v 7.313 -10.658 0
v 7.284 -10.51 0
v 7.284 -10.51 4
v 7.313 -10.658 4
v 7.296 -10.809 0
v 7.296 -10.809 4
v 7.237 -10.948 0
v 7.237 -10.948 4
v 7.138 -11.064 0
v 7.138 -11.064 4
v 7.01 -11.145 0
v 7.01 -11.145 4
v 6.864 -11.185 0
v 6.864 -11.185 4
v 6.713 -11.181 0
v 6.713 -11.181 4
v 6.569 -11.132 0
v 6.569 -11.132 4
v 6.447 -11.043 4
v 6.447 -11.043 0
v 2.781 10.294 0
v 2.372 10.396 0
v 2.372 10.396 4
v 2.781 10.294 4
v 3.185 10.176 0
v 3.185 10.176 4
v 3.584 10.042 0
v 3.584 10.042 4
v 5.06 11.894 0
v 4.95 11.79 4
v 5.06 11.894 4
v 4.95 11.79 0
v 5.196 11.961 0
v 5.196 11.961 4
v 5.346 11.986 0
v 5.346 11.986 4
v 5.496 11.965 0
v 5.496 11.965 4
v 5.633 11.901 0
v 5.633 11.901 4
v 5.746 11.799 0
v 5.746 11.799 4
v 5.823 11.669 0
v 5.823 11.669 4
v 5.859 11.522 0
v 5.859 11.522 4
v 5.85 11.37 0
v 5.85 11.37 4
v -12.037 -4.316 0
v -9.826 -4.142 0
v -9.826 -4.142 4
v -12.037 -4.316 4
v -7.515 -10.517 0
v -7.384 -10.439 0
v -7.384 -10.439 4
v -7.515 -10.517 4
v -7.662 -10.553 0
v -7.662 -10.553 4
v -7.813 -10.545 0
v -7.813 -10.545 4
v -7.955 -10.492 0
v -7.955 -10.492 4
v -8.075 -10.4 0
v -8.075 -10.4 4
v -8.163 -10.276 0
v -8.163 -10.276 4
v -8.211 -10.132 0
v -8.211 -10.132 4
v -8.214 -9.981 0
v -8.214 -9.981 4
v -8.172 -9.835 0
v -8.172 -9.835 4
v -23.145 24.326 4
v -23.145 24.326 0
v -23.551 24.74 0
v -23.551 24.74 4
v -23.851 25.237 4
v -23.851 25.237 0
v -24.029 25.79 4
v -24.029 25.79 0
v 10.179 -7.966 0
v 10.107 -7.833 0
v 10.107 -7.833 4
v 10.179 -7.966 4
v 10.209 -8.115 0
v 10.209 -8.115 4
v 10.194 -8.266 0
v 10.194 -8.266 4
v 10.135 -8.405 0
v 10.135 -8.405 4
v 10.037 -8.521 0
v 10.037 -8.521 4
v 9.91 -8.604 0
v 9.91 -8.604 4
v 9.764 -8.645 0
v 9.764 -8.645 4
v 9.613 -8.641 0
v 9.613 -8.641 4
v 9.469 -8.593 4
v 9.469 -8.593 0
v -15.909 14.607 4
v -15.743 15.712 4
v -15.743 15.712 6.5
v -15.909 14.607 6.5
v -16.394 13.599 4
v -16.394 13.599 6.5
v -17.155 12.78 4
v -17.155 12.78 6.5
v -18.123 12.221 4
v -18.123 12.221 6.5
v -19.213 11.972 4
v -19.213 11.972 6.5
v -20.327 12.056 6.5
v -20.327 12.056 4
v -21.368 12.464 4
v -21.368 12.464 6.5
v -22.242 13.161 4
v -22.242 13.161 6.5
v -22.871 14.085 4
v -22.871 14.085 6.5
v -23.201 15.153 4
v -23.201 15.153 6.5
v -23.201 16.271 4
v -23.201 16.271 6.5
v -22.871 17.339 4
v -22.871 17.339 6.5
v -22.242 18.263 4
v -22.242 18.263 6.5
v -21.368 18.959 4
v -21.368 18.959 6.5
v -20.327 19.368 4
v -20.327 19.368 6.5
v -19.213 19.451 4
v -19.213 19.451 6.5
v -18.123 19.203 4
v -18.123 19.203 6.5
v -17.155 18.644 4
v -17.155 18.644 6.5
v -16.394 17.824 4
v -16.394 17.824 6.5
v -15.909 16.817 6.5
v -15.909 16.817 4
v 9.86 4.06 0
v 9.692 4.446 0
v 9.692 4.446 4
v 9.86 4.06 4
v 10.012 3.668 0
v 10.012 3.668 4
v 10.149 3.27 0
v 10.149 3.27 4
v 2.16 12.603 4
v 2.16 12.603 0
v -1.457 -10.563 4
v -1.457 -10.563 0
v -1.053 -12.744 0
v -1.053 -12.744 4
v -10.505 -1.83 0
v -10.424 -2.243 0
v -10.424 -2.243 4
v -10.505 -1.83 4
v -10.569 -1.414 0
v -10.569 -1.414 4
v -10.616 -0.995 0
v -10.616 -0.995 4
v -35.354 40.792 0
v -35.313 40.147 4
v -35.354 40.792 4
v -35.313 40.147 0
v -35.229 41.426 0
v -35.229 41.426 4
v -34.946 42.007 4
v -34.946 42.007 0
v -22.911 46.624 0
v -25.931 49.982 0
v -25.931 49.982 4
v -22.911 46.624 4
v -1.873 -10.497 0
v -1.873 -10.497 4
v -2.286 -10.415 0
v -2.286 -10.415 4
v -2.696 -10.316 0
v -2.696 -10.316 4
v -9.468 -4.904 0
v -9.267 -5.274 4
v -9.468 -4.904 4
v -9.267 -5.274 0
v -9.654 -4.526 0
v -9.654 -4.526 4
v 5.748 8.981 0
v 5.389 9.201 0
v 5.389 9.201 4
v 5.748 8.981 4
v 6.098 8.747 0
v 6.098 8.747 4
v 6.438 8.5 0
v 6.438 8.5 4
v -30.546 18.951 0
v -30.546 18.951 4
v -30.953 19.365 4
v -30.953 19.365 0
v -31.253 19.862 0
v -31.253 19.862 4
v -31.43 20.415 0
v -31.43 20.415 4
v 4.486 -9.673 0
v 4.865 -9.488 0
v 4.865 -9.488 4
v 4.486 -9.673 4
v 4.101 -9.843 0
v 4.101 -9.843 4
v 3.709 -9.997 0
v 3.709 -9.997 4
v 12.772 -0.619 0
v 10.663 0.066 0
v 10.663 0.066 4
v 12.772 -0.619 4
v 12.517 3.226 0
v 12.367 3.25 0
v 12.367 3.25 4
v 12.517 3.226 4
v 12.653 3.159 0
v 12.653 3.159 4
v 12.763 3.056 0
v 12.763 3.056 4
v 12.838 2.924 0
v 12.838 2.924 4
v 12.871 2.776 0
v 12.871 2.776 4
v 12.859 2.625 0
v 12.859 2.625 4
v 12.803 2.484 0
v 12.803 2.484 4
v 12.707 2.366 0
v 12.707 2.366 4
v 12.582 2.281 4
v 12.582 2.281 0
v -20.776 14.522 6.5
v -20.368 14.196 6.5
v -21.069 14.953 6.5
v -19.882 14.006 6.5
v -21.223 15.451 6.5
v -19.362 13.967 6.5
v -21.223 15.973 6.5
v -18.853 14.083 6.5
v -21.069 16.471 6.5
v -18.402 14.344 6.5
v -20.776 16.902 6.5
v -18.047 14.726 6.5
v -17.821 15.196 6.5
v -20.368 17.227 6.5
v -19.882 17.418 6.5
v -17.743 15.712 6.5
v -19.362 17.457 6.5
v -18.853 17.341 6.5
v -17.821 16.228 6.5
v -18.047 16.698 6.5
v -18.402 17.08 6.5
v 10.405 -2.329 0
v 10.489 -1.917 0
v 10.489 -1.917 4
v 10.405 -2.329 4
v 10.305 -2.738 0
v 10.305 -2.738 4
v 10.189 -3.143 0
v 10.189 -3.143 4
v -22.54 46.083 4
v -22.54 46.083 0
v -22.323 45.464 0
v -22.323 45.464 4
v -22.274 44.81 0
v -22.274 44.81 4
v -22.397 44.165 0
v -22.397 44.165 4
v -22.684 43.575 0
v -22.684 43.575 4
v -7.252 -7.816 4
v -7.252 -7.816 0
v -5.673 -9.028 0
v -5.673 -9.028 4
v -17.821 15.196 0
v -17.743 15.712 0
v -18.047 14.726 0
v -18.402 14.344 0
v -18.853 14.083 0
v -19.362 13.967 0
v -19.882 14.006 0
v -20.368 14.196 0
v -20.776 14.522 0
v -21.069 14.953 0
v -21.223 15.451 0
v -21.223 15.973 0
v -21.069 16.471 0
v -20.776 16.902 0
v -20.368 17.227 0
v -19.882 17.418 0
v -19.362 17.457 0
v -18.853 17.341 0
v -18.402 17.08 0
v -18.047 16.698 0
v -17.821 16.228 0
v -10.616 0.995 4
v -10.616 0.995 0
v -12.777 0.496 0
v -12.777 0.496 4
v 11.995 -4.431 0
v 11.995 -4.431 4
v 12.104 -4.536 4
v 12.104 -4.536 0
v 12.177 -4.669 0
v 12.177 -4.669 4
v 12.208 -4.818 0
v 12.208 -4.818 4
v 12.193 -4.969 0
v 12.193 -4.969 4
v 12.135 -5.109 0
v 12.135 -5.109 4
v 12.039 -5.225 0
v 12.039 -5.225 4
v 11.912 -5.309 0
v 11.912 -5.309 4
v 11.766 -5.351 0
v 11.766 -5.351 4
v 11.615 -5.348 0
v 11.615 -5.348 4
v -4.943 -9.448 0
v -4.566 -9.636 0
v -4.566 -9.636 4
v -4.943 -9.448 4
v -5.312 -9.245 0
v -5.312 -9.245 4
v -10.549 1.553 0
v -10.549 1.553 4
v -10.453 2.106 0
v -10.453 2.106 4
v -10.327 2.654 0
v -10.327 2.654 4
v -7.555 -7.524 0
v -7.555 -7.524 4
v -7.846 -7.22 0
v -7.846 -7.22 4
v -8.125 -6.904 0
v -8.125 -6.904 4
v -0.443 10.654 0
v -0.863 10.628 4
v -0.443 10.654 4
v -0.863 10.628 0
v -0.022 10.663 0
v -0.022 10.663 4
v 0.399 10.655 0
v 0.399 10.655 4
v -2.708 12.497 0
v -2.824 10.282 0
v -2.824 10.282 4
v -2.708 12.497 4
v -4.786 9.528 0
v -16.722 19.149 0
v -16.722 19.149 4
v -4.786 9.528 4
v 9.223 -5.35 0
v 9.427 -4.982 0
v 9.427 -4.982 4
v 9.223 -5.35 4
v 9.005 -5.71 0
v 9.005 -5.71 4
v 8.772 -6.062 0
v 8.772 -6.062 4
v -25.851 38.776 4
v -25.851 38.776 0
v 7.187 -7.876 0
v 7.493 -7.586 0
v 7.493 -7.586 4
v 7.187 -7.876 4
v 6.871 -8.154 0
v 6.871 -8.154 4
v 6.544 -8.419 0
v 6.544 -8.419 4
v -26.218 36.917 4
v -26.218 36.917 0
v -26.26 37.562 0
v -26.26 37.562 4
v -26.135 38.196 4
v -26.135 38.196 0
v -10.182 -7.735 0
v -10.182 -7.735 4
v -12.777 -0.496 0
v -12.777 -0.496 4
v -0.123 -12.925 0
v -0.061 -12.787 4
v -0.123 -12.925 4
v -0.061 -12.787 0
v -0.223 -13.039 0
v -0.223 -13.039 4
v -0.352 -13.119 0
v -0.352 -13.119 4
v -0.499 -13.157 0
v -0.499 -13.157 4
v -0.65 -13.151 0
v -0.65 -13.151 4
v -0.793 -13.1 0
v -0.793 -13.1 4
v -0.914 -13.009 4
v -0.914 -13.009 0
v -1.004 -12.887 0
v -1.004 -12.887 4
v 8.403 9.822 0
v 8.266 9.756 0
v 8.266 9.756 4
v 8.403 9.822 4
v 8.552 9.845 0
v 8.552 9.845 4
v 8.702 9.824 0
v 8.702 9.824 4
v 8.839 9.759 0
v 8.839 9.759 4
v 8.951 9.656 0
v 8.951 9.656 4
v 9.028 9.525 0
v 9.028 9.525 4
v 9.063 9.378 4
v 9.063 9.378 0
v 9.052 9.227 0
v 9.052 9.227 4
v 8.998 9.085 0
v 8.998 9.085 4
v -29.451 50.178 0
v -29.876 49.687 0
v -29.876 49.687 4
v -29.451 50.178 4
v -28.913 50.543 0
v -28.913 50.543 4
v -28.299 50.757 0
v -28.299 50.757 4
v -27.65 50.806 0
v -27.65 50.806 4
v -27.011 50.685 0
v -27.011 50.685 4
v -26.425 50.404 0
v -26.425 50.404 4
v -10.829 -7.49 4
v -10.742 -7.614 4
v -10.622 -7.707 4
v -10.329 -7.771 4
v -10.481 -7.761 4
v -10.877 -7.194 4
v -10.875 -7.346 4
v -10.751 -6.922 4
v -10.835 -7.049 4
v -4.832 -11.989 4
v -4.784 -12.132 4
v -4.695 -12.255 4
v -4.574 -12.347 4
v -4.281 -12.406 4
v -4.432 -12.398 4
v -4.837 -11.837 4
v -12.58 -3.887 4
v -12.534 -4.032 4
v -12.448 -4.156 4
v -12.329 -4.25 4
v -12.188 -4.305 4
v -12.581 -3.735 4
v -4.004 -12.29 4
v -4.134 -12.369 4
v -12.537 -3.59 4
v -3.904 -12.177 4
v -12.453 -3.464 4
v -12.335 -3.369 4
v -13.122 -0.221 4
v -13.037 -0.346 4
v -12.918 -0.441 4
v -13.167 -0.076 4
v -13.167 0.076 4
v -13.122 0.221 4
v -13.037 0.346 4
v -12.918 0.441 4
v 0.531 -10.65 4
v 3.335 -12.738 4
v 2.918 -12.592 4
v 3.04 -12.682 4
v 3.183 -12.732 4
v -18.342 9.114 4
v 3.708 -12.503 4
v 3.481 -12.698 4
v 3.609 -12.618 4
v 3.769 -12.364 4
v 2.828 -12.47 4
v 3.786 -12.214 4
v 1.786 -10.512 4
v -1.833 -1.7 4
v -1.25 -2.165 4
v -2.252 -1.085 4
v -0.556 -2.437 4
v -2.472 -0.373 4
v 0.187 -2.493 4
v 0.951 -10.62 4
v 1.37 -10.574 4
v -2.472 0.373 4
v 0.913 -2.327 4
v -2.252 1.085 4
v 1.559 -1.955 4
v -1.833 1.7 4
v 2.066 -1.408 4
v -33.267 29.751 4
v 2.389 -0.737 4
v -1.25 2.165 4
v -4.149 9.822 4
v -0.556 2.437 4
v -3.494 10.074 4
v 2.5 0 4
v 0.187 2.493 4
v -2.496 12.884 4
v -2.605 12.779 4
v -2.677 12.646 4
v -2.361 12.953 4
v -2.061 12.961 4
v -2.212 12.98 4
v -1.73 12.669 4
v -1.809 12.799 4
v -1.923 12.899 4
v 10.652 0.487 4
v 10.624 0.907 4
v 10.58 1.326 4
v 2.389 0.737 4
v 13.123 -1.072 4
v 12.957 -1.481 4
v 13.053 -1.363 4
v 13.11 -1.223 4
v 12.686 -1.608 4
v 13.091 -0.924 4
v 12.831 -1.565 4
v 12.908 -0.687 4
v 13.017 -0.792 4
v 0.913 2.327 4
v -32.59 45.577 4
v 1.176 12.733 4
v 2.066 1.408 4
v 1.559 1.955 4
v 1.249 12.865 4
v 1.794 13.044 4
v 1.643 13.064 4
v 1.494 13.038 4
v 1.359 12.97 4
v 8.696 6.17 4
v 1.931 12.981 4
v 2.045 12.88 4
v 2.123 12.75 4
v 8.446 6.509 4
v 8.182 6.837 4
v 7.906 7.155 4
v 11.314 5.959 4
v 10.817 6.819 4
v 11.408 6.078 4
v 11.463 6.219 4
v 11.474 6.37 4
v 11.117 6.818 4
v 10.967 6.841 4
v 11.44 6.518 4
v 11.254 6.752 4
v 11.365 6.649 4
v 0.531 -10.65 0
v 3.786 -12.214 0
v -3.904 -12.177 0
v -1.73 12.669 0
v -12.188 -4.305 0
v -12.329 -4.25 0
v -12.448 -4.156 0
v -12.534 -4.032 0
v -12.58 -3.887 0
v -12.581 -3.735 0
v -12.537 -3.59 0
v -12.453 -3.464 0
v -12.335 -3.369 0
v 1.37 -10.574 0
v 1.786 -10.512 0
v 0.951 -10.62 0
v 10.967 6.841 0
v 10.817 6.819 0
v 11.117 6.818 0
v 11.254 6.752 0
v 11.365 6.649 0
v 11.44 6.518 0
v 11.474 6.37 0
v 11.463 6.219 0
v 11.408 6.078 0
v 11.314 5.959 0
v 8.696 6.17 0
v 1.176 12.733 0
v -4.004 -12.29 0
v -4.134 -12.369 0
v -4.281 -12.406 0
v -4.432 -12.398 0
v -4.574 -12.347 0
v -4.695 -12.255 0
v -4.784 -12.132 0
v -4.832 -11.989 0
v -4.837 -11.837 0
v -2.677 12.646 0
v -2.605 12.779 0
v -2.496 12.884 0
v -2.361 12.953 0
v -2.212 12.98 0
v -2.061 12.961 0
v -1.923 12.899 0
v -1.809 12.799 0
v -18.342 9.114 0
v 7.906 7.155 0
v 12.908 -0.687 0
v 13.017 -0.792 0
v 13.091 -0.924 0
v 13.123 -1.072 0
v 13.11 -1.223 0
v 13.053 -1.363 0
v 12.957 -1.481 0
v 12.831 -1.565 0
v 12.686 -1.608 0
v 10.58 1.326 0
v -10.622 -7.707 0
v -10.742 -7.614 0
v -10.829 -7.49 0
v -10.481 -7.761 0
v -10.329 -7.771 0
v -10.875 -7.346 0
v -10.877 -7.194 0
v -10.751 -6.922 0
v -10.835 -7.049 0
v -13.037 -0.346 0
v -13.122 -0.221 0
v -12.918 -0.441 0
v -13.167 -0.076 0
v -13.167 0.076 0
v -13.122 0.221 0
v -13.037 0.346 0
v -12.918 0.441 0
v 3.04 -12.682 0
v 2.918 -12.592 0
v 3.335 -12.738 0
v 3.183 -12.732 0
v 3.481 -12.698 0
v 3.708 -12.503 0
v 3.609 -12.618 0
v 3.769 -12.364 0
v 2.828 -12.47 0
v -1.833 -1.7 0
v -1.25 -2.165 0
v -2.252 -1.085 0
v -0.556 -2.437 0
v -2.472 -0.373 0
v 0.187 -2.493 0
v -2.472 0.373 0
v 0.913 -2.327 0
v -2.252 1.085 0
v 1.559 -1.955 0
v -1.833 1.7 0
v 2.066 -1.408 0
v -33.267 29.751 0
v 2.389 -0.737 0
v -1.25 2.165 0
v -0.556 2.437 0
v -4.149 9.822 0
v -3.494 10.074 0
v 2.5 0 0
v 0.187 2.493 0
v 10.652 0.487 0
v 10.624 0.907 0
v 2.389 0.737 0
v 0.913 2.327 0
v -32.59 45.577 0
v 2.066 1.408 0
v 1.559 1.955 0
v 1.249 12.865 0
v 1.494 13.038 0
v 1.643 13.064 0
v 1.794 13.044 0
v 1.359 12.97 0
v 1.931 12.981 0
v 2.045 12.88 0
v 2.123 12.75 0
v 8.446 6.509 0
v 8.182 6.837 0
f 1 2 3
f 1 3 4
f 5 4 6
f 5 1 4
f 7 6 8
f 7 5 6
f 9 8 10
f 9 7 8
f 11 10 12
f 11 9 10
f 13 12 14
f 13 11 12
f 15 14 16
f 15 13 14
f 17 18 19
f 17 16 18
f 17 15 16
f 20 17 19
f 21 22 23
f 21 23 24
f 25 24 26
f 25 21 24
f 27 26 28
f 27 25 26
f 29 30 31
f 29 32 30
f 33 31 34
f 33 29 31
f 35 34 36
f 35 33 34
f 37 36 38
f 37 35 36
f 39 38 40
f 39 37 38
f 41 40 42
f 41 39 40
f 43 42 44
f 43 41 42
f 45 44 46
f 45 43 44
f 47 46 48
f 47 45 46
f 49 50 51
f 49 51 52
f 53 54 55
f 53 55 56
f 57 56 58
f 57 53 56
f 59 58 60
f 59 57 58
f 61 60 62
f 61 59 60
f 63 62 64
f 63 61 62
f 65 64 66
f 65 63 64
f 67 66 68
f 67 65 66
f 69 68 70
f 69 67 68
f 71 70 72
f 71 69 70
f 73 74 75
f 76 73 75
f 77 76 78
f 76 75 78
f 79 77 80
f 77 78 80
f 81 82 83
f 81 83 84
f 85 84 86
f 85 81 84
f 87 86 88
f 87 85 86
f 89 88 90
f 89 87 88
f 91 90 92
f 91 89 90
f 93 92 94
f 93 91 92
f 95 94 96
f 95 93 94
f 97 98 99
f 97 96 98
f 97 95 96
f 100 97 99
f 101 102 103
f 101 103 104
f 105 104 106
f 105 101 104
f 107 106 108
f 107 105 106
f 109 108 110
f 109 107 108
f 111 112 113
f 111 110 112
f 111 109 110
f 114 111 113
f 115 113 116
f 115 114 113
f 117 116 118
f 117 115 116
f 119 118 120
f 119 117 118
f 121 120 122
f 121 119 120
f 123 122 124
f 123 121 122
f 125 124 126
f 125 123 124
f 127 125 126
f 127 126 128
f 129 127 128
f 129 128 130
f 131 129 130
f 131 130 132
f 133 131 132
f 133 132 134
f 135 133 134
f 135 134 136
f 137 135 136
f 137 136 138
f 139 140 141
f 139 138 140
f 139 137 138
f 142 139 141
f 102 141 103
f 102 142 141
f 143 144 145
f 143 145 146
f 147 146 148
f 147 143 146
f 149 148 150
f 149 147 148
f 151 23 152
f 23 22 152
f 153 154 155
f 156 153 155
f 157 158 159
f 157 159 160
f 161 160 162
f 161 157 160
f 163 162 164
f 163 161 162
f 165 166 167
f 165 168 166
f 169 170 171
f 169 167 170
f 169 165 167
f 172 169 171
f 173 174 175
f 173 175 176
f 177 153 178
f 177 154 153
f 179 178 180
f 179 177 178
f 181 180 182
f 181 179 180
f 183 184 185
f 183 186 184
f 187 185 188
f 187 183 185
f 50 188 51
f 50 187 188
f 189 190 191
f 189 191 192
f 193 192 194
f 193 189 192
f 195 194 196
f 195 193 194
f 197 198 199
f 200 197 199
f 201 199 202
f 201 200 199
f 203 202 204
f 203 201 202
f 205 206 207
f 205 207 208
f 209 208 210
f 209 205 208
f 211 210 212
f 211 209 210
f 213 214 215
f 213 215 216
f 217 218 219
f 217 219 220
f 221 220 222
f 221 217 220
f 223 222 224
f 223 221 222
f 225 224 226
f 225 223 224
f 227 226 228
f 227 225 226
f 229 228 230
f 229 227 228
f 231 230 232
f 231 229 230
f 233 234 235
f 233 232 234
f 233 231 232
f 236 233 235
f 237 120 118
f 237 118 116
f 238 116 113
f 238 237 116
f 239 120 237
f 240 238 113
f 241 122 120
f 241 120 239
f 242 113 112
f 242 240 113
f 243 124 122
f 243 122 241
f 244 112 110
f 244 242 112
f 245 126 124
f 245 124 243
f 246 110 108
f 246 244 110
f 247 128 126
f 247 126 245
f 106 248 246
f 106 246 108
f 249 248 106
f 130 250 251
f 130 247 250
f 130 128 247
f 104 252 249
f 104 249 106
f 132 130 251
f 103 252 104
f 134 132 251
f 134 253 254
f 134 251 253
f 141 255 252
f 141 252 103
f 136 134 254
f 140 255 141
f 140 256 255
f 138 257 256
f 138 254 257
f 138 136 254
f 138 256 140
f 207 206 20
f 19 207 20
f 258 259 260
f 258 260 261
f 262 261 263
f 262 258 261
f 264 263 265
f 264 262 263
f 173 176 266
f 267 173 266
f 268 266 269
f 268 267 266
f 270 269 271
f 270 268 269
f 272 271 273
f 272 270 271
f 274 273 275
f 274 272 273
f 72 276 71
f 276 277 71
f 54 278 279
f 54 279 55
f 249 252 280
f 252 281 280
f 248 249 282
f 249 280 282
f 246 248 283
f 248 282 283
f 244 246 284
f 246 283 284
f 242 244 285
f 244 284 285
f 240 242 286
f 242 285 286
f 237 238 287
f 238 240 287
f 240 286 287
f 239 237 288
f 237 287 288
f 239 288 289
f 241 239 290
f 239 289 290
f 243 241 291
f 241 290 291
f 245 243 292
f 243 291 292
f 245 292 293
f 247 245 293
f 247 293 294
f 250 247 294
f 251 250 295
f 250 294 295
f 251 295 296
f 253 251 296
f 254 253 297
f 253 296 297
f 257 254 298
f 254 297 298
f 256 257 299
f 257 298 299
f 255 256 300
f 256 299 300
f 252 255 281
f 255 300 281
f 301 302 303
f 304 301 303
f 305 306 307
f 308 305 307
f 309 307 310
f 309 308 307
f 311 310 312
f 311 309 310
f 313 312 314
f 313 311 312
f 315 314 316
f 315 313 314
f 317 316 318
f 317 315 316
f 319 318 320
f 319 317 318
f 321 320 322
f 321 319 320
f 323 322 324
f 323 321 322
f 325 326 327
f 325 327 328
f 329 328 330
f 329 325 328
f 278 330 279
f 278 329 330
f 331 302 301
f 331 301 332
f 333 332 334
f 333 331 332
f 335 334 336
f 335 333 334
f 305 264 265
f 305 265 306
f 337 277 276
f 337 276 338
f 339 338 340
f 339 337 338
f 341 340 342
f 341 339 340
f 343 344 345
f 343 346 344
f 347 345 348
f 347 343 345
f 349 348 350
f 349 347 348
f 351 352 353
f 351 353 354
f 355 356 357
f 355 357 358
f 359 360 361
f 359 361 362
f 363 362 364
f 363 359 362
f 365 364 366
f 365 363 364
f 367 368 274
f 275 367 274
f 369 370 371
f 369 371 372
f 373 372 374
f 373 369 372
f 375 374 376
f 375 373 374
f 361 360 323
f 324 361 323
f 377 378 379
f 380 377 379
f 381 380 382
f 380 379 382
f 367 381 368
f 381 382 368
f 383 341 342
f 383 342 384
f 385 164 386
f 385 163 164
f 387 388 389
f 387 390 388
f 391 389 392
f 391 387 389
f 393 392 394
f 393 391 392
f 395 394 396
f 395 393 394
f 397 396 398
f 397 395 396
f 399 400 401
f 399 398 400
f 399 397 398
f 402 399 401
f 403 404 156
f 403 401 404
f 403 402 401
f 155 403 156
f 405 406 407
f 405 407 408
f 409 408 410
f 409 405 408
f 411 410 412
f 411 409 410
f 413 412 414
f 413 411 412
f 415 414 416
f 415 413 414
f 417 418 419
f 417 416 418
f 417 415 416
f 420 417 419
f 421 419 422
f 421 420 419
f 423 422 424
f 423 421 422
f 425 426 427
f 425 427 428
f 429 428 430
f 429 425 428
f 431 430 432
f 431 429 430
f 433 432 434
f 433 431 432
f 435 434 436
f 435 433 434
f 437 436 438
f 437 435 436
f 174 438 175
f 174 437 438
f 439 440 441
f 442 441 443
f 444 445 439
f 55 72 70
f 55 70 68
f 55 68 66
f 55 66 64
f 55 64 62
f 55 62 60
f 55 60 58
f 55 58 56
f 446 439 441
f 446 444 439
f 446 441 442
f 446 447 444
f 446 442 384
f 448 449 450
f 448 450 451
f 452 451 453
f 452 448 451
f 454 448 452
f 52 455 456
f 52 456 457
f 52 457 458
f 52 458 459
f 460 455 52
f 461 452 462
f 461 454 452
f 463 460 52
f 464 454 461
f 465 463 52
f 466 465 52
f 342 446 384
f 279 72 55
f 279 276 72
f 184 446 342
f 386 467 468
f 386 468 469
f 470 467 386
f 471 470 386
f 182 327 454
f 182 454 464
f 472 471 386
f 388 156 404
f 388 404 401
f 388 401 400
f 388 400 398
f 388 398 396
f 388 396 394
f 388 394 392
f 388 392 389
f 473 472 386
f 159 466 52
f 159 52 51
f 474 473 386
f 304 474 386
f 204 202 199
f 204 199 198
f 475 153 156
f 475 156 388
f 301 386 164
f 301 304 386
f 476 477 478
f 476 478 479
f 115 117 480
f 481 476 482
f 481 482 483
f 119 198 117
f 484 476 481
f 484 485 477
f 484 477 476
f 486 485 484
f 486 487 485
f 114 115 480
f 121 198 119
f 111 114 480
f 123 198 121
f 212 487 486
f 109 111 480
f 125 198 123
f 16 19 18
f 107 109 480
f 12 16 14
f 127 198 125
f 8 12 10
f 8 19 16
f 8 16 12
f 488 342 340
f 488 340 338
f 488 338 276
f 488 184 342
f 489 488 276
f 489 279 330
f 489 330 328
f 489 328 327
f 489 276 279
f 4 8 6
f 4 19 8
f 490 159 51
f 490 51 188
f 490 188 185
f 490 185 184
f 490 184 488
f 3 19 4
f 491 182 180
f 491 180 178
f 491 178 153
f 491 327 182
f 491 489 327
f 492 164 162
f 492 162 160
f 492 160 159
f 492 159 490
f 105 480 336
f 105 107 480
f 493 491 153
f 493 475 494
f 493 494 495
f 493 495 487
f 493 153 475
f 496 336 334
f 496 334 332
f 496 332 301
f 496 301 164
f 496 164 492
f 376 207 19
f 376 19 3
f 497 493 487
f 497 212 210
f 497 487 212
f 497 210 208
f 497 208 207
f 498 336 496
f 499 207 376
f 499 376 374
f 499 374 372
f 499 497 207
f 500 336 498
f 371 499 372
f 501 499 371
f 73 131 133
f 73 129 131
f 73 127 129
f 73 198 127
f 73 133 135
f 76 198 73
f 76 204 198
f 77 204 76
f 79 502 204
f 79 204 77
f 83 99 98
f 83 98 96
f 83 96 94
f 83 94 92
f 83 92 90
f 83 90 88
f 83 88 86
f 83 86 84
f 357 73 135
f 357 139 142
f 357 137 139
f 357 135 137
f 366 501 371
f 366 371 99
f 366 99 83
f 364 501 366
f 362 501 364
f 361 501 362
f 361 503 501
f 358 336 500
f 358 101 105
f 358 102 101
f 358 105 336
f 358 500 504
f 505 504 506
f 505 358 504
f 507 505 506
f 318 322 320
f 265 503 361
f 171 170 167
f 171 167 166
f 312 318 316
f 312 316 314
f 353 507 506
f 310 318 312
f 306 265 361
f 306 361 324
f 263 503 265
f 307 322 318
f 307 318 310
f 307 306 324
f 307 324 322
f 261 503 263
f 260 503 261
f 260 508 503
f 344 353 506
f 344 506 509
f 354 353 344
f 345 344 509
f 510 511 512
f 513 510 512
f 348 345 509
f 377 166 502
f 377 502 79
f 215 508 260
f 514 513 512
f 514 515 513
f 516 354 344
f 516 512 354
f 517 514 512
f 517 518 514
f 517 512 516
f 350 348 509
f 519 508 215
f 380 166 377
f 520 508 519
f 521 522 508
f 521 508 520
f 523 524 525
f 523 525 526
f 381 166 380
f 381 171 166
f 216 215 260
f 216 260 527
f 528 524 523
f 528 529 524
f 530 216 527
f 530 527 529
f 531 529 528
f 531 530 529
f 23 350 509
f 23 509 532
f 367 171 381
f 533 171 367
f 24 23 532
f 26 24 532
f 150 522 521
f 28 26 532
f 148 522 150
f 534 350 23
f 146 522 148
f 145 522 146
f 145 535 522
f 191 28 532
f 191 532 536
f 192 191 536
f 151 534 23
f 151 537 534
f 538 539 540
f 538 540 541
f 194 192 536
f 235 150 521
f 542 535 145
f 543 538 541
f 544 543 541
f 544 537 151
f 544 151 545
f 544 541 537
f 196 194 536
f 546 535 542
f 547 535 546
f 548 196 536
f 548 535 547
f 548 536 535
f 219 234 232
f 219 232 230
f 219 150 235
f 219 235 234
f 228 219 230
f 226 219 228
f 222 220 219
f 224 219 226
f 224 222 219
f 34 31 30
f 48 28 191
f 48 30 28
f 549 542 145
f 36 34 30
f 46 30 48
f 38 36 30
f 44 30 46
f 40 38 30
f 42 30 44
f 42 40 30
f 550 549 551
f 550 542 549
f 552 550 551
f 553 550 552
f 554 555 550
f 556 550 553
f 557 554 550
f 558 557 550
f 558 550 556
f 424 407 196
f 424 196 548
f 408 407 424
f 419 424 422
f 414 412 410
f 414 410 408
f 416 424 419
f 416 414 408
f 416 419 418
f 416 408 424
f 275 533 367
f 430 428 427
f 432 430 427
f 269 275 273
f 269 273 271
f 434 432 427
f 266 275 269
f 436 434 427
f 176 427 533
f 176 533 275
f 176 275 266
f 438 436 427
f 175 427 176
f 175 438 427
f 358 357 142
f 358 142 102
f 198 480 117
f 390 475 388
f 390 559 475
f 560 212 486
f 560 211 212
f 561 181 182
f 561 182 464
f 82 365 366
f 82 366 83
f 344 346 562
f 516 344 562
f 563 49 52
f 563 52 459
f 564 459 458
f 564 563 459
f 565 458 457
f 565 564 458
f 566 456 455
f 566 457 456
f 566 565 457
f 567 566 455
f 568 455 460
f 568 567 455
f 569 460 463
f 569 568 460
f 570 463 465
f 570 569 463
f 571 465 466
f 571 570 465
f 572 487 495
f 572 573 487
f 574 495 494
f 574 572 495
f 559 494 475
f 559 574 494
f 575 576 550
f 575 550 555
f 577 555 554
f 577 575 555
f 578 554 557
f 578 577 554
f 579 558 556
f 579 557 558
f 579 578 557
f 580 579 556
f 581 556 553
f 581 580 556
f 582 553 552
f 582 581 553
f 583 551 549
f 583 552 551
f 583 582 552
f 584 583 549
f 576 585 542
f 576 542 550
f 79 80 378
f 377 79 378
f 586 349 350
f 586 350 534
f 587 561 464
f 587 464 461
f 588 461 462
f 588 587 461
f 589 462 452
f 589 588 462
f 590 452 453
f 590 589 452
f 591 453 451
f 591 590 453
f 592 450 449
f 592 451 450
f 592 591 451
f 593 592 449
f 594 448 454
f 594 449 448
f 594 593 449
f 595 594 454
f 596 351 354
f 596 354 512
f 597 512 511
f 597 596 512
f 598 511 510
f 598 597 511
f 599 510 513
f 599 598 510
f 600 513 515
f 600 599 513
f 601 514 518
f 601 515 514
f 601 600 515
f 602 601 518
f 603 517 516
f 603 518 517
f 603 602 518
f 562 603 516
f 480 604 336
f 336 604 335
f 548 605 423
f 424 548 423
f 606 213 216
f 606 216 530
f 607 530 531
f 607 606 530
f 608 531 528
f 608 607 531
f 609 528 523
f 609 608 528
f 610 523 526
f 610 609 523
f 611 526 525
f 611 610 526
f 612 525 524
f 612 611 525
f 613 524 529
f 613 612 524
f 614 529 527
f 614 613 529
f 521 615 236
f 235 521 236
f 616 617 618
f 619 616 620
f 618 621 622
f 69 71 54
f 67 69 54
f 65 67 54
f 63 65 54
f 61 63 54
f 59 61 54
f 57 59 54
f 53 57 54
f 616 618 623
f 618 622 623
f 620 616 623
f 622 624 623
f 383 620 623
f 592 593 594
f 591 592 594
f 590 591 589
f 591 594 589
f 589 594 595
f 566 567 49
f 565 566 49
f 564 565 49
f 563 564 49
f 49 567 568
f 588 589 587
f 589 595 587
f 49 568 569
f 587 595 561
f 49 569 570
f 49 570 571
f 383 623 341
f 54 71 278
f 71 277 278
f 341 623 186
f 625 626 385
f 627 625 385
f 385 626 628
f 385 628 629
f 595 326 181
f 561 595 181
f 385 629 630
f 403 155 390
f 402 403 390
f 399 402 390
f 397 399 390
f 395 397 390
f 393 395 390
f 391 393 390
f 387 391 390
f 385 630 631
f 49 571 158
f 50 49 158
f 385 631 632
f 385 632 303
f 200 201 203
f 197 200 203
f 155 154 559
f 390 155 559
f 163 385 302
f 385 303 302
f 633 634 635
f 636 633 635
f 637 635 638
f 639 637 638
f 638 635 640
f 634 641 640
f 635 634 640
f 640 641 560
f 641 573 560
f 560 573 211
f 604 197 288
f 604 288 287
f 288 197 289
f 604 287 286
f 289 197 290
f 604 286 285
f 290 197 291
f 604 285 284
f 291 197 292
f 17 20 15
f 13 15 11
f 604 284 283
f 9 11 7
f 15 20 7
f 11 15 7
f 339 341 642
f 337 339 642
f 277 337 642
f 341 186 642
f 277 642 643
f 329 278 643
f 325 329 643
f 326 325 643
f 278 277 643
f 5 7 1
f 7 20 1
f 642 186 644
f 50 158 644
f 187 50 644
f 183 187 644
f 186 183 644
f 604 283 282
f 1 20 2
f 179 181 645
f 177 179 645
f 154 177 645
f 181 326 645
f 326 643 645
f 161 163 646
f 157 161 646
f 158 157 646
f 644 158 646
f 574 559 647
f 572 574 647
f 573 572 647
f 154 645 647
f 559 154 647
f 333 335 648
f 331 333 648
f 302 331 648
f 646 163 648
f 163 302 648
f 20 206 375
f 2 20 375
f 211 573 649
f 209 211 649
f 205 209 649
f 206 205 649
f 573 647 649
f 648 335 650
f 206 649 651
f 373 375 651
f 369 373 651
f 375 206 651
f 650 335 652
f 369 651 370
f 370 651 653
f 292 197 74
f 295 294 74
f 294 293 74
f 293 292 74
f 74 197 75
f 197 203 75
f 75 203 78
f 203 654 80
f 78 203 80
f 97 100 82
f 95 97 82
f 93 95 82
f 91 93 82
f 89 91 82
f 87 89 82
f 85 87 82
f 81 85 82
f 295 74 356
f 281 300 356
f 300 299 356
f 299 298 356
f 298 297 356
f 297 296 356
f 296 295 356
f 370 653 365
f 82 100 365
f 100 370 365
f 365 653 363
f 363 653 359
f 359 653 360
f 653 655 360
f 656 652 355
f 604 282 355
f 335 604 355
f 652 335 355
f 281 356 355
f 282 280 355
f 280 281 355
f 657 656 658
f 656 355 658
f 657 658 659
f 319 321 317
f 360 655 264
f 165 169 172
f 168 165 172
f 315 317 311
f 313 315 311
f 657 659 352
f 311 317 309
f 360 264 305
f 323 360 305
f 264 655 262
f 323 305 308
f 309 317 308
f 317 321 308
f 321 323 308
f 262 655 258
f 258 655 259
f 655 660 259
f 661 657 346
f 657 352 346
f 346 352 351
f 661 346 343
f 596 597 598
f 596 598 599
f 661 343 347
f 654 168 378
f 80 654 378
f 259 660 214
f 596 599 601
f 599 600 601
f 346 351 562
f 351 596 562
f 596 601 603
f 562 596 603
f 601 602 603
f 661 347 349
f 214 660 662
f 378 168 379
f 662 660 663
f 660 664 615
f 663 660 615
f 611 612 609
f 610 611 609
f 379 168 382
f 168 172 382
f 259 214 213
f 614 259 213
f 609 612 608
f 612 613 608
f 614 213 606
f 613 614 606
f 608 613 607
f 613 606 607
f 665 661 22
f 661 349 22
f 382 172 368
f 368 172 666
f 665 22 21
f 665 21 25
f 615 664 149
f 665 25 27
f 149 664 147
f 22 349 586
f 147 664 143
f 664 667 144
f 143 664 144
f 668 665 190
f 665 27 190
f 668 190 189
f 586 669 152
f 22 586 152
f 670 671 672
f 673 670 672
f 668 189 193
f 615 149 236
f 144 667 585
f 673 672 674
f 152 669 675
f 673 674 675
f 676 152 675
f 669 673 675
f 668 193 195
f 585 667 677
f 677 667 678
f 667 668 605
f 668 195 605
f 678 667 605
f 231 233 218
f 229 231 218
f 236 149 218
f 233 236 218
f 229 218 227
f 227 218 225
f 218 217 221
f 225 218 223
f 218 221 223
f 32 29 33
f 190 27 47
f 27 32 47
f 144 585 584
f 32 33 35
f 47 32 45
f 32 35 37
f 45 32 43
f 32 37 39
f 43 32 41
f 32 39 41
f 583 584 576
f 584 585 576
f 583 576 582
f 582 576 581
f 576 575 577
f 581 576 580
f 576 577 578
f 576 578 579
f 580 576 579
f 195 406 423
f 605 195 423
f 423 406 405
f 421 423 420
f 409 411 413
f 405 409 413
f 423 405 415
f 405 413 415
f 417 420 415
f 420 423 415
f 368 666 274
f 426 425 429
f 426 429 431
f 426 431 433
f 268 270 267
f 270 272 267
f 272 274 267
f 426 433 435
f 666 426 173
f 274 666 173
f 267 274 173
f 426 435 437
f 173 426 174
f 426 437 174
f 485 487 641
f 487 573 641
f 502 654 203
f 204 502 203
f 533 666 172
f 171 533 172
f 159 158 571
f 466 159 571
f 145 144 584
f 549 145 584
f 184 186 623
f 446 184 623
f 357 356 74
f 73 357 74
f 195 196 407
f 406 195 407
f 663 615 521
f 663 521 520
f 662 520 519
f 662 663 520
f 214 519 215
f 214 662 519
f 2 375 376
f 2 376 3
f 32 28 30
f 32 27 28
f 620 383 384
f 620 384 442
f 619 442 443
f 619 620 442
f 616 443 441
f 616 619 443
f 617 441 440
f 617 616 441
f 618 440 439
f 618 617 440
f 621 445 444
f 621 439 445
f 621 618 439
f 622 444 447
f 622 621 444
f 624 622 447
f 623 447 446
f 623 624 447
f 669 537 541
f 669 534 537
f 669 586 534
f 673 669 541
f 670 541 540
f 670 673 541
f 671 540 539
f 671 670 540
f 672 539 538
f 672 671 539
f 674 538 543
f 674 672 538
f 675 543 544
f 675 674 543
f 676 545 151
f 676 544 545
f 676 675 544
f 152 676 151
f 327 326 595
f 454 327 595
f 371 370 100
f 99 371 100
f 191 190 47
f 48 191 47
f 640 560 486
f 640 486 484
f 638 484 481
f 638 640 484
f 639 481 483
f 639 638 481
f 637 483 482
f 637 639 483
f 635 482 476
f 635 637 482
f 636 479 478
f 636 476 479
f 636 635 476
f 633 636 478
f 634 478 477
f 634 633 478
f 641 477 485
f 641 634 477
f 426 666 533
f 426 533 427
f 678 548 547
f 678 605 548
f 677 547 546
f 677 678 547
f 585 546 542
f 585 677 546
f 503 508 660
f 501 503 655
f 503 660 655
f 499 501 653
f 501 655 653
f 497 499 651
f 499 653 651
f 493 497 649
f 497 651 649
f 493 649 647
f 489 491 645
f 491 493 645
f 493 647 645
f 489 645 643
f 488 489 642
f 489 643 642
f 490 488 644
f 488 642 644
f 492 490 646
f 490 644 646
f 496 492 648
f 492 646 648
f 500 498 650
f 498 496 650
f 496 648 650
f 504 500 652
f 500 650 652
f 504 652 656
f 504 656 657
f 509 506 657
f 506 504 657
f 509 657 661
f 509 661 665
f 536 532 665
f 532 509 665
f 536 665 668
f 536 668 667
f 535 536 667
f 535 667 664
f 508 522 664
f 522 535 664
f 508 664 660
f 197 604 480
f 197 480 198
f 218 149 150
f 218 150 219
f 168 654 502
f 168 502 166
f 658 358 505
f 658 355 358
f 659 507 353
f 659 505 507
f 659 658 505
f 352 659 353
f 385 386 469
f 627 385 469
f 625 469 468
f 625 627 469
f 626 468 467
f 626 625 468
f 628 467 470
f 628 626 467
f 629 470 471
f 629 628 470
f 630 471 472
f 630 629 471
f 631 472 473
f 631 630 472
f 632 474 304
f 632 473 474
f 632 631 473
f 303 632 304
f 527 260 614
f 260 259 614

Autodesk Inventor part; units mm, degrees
ref_plane "YZ Plane" through (0, 0, 0) normal (1, 0, 0) x (0, 1, 0)
ref_plane "XZ Plane" through (0, 0, 0) normal (0, 1, 0) x (-1, 0, 0)
ref_plane "XY Plane" through (0, 0, 0) normal (0, 0, 1) x (1, 0, 0)
sketch "Sketch1" plane through (0, 0, 0) normal (0, 0, 1) x (1, 0, 0)
  circle A0 centre (0, 0) radius 2.5
  line L0 (0, 0) -> (-15.5714, 12.5511)
  line L1 (0, 0) -> (20, 0) construction
  line L2 (-15.5714, 12.5511) -> (-18.3421, 9.1137)
  line L3 (0, 0) -> (-10.3273, 2.6535)
  line L4 (0, 0) -> (26.0413, 0) construction
  line L5 (-18.3421, 9.1137) -> (-10.3273, 2.6535)
  line L6 (-23.1447, 24.3261) -> (-21.5758, 26.2725)
  circle A1 centre (-21.5758, 26.2725) radius 2.5
  line L7 (-23.6708, 23.9703) -> (-17.7415, 23.9703) construction
  line L8 (-24.0288, 25.7899) -> (-26.2178, 36.9166)
  line L9 (-24.0288, 25.7899) -> (-12.6888, 25.7899) construction
  line L10 (-26.2178, 36.9166) -> (-23.7649, 37.3992)
  circle A2 centre (-23.7649, 37.3992) radius 2.5
  line L11 (-26.2069, 38.2378) -> (-20.9991, 38.2378) construction
  line L12 (-25.8513, 38.7765) -> (-22.6835, 43.5752)
  line L13 (-25.8513, 38.7765) -> (-20.1013, 38.7765) construction
  line L14 (-22.6835, 43.5752) -> (-24.7699, 44.9525)
  circle A3 centre (-24.7699, 44.9525) radius 2.5
  line L15 (0, 0) -> (60, 0) construction
  line L16 (-25.9313, 49.9817) -> (-22.9112, 46.6245)
  line L17 (-24.7699, 40.4146) -> (-32.5897, 45.5767)
  line L18 (-32.5897, 45.5767) -> (-29.8763, 49.6871)
  line L19 (-32.5897, 45.5767) -> (-34.946, 42.0073)
  line L20 (-25.1233, 31.3533) -> (-33.2672, 29.7511)
  line L21 (-33.2672, 29.7511) -> (-35.3126, 40.1474)
  line L22 (-33.2672, 29.7511) -> (-31.4304, 20.4146)
  line L23 (-18.3421, 9.1137) -> (-30.5463, 18.9507)
  line L24 (-16.7222, 19.1493) -> (-22.2635, 12.2745)
  arc A4 (-10.3273, 2.6535) -> (-4.786, 9.5283) centre (0, 0) ccw
  arc A5 (-25.9313, 49.9817) -> (-29.8763, 49.6871) centre (-27.7899, 48.3098) ccw
  arc A6 (-34.946, 42.0073) -> (-35.3126, 40.1474) centre (-32.8596, 40.63) ccw
  arc A7 (-31.4304, 20.4146) -> (-30.5463, 18.9507) centre (-28.9774, 20.8971) ccw
  line L25 (-16.7222, 19.1493) -> (-23.1447, 24.3261)
  line L26 (-16.7222, 19.1493) -> (-4.786, 9.5283)
  circle A8 centre (-19.4928, 15.7119) radius 1.75
  line L27 (0, 0) -> (-10.6628, 0)
  line L28 (-4.786, 9.5283) -> (0, 0)
  arc A9 (-12.7774, 0.4964) -> (-12.7774, -0.4964) centre (-12.6628, 0) ccw
  line L29 (-10.6628, 0) -> (-10.1628, 0)
  line L30 (-10.6162, 0.9953) -> (-12.7774, 0.4964)
  line L31 (-10.6162, -0.9953) -> (-12.7774, -0.4964)
  line L32 (-10.4242, -2.2431) -> (-12.3353, -3.3688)
  line L33 (-9.8256, -4.1416) -> (-12.0367, -4.3157)
  arc A10 (-12.3353, -3.3688) -> (-12.0367, -4.3157) centre (-12.0767, -3.8078) ccw
  line L34 (-9.2672, -5.2739) -> (-10.7513, -6.9222)
  line L35 (-8.1254, -6.9045) -> (-10.1819, -7.7354)
  arc A11 (-10.7513, -6.9222) -> (-10.1819, -7.7354) centre (-10.3727, -7.2631) ccw
  line L36 (-7.2524, -7.8165) -> (-8.1722, -9.8348)
  line L37 (-5.6731, -9.0283) -> (-7.3845, -10.4392)
  arc A12 (-8.1722, -9.8348) -> (-7.3845, -10.4392) centre (-7.7086, -10.046) ccw
  line L38 (-4.5663, -9.6356) -> (-4.8366, -11.837)
  line L39 (-2.6957, -10.3164) -> (-3.9036, -12.1766)
  arc A13 (-4.8366, -11.837) -> (-3.9036, -12.1766) centre (-4.3309, -11.8991) ccw
  line L40 (-1.4574, -10.5627) -> (-1.0533, -12.7435)
  line L41 (0.5313, -10.6495) -> (-0.0614, -12.7869)
  arc A14 (-1.0533, -12.7435) -> (-0.0614, -12.7869) centre (-0.5523, -12.6507) ccw
  line L42 (1.7863, -10.5121) -> (2.8275, -12.4705)
  line L43 (3.7091, -9.9969) -> (3.7865, -12.2135)
  arc A15 (2.8275, -12.4705) -> (3.7865, -12.2135) centre (3.2774, -12.2313) ccw
  line L44 (4.8646, -9.4884) -> (6.4466, -11.043)
  line L45 (6.5435, -8.4188) -> (7.2839, -10.5096)
  arc A16 (6.4466, -11.043) -> (7.2839, -10.5096) centre (6.8037, -10.6797) ccw
  line L46 (7.4927, -7.5864) -> (9.4689, -8.5934)
  line L47 (8.7723, -6.0615) -> (10.1071, -7.8329)
  arc A17 (9.4689, -8.5934) -> (10.1071, -7.8329) centre (9.7002, -8.1395) ccw
  line L48 (9.4272, -4.9822) -> (11.6148, -5.3483)
  line L49 (10.189, -3.1431) -> (11.9947, -4.4311)
  arc A18 (11.6148, -5.3483) -> (11.9947, -4.4311) centre (11.6989, -4.8458) ccw
  line L50 (10.4891, -1.9168) -> (12.6855, -1.6081)
  line L51 (10.6626, 0.0663) -> (12.772, -0.6191)
  arc A19 (12.6855, -1.6081) -> (12.772, -0.6191) centre (12.6146, -1.1036) ccw
  line L52 (10.58, 1.326) -> (12.5819, 2.2809)
  line L53 (10.1491, 3.2695) -> (12.367, 3.2502)
  arc A20 (12.5819, 2.2809) -> (12.367, 3.2502) centre (12.3626, 2.7407) ccw
  line L54 (9.6916, 4.4461) -> (11.3137, 5.9588)
  line L55 (8.6962, 6.1701) -> (10.8173, 6.8186)
  arc A21 (11.3137, 5.9588) -> (10.8173, 6.8186) centre (10.9663, 6.3314) ccw
  line L56 (7.906, 7.1547) -> (8.9982, 9.0851)
  line L57 (6.4384, 8.4995) -> (8.2663, 9.7558)
  arc A22 (8.9982, 9.0851) -> (8.2663, 9.7558) centre (8.5548, 9.336) ccw
  line L58 (5.3887, 9.2009) -> (5.8498, 11.3704)
  line L59 (3.5845, 10.0422) -> (4.9501, 11.79)
  arc A23 (5.8498, 11.3704) -> (4.9501, 11.79) centre (5.3515, 11.4764) ccw
  line L60 (2.3725, 10.3955) -> (2.1599, 12.6033)
  line L61 (0.3989, 10.6553) -> (1.1756, 12.7328)
  arc A24 (2.1599, 12.6033) -> (1.1756, 12.7328) centre (1.6528, 12.5544) ccw
  line L62 (-0.8633, 10.6278) -> (-1.7299, 12.6694)
  line L63 (-2.8237, 10.2821) -> (-2.7076, 12.497)
  arc A25 (-1.7299, 12.6694) -> (-2.7076, 12.497) centre (-2.1989, 12.4704) ccw
  point P0 (-10.1693, -3.2064)
  point P1 (-8.7344, -6.1159)
  point P2 (-6.4911, -8.4593)
  point P3 (-3.6469, -10.0197)
  point P4 (-0.4651, -10.6526)
  point P5 (2.7597, -10.2994)
  point P6 (5.7291, -8.9929)
  point P7 (8.1681, -6.8539)
  point P8 (9.8511, -4.0805)
  point P9 (10.6222, -0.9293)
  point P10 (10.41, 2.3078)
  point P11 (9.2342, 5.3314)
  point P12 (7.2037, 7.8614)
  point P13 (4.5063, 9.6637)
  point P14 (1.3918, 10.5715)
  point P15 (-1.8516, 10.5008)
  dimension "d0" = 5
  dimension "d1" = 20
  dimension "d2" = 141.13
  dimension "d3" = 4.415
  dimension "d4" = 165.59
  dimension "d6" = 10.2942
  dimension "d8" = 2.5
  dimension "d11" = 11.34
  dimension "d13" = 101.13
  dimension "d14" = 2.5
  dimension "d16" = 5.75
  dimension "d17" = 56.57
  dimension "d18" = 2.5
  dimension "d22" = 9.37
  dimension "d23" = 8.3
  dimension "d25" = 8.83
  dimension "d26" = 2.5
  dimension "d27" = 3.5
  dimension "d34" = 63.33
  dimension "d41" = 0.5
  dimension "d46" = 280
extrude "Extrusion1" add sketch "Sketch1" along normal blind 4 contours A0 L28 A4 L27 | A0 L0 L2 L23 L24 A8 L26 L28 | L27 A4 L3 A0 | A0 L3 L5 L2 L0 | L63 A25 L62 A4 | L24 A8 L23 A7 L22 L20 L8 A1 L25 | A4 L31 A9 L30 | L61 A24 L60 A4 | A4 L33 A10 L32 | L20 L21 A6 L19 L17 L12 A2 L8 | L59 A23 L58 A4 | A4 L35 A11 L34 | L57 A22 L56 A4 | L17 L18 A5 L16 A3 L12 | A4 L37 A12 L36 | A3 | L55 A21 L54 A4 | A4 L39 A13 L38 | L53 A20 L52 A4 | A4 L41 A14 L40 | L51 A19 L50 A4 | A4 L43 A15 L42 | L49 A18 L48 A4 | A4 L45 A16 L44 | L47 A17 L46 A4
sketch "Sketch2" plane through (0, 0, 4) normal (0, 0, 1) x (1, 0, 0)
  circle A0 centre (-19.4928, 15.7119) radius 1.75 projected
  circle A1 centre (-19.4928, 15.7119) radius 1.75
  circle A2 centre (-19.4928, 15.7119) radius 3.75
  point P0 (0, 0)
  dimension "d50" = 7.5
extrude "Extrusion2" add sketch "Sketch2" along normal blind 2.5
sketch "Sketch3" plane through (0, 0, 4) normal (0, 0, 1) x (1, 0, 0)
  circle A0 centre (0, 0) radius 2.5 projected
  arc A1 (3.5845, 10.0422) -> (2.3725, 10.3955) centre (0, 0) ccw projected
  arc A2 (6.4384, 8.4995) -> (5.3887, 9.2009) centre (0, 0) ccw projected
  line L0 (3.5845, 10.0422) -> (5.3887, 9.2009)
  arc A3 (5.8498, 11.3704) -> (4.9501, 11.79) centre (5.3515, 11.4764) ccw projected
  line L1 (4.4866, 9.6215) -> (5.3515, 11.4764)
  dimension "d53" = 1.9906
  dimension "d54" = 2.0466
properties part number "Servo pinza 2"
